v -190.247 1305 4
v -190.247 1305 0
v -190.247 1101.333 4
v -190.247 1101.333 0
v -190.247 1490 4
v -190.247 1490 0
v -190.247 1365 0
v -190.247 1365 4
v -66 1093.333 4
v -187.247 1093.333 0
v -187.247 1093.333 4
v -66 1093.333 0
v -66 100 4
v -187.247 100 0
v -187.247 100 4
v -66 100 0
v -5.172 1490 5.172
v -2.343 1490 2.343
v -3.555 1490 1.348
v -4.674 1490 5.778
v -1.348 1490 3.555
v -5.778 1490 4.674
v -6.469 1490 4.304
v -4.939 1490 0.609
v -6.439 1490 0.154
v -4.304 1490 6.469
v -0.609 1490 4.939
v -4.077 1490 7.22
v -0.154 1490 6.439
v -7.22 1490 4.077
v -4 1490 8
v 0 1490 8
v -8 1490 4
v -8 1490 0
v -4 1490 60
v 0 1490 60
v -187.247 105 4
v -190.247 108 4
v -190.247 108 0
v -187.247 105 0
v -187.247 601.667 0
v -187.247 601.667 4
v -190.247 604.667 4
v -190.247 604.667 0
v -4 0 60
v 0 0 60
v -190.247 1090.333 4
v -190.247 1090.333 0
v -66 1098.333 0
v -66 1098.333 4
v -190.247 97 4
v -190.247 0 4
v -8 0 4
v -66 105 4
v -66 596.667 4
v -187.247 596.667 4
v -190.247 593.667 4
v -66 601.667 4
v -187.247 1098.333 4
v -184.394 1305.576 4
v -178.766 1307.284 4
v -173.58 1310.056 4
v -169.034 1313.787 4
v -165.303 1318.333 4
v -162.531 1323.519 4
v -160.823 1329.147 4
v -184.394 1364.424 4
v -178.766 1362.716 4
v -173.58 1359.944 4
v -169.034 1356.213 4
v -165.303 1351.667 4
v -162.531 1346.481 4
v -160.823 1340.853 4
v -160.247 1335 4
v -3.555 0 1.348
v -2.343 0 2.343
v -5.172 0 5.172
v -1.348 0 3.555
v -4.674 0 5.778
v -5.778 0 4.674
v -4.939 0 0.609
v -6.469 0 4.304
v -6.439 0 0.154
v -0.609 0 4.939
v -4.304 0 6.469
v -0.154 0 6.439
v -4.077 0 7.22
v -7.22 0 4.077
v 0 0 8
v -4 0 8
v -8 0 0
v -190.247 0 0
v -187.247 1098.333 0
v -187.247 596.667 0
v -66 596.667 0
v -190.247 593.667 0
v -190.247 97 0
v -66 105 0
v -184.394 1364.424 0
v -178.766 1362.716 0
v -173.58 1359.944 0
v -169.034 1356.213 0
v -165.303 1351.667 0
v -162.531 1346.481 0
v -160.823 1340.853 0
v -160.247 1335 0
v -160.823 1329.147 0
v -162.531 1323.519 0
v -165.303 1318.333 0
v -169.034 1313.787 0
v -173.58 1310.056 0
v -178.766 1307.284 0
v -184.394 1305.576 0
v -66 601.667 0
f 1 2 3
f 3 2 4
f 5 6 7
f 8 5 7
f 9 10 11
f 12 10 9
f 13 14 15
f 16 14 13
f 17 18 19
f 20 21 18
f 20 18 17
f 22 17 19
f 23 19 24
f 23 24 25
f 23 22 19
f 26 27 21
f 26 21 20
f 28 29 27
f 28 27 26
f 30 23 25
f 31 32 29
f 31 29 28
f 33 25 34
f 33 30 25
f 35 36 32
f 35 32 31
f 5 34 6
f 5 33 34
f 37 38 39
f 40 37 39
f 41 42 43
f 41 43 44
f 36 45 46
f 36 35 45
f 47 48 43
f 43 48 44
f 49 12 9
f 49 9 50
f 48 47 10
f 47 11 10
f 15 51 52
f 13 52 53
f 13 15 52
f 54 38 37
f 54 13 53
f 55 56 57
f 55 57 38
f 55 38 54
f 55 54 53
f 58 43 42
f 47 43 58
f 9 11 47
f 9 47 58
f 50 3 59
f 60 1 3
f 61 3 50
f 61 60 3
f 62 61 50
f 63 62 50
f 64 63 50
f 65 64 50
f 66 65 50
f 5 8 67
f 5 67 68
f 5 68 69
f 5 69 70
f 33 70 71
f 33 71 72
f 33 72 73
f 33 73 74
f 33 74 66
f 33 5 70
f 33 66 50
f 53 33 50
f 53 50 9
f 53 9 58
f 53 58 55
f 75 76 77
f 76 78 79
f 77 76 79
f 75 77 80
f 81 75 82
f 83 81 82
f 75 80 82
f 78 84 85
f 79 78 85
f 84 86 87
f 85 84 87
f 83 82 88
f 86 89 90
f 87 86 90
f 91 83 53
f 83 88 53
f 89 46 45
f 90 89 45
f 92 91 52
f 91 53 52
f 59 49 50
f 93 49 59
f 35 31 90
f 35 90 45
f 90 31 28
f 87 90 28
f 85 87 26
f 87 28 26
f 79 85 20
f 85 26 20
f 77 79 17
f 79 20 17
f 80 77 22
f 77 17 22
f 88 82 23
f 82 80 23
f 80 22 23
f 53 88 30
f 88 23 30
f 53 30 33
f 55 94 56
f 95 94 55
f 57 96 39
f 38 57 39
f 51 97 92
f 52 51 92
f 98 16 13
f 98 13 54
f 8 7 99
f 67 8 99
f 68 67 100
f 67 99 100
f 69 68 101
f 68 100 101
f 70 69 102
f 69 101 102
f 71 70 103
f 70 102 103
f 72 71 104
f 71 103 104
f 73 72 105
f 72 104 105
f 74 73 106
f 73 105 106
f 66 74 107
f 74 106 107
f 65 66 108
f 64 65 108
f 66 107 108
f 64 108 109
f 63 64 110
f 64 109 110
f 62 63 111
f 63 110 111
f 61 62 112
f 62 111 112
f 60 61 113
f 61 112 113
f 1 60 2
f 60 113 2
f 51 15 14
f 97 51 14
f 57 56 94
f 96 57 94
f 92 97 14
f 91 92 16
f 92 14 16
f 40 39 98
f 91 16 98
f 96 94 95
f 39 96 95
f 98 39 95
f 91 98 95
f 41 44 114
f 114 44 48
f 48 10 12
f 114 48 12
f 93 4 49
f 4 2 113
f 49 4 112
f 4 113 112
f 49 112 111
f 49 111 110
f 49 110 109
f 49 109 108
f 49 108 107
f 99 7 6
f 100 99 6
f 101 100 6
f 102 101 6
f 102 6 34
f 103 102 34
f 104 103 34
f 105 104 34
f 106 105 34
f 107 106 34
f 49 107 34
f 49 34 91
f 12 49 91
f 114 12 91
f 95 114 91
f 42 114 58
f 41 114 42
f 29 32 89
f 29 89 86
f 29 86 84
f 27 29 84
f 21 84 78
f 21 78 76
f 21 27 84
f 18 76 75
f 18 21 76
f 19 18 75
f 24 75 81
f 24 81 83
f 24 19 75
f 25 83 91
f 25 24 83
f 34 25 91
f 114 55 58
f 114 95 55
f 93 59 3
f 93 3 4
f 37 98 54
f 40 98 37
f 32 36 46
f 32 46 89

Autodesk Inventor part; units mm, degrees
ref_plane "YZ Plane" through (0, 0, 0) normal (1, 0, 0) x (0, 1, 0)
ref_plane "XZ Plane" through (0, 0, 0) normal (0, 1, 0) x (-1, 0, 0)
ref_plane "XY Plane" through (0, 0, 0) normal (0, 0, 1) x (1, 0, 0)
sketch "Sketch1" plane through (0, 0, 0) normal (0, 0, 1) x (1, 0, 0)
  line L0 (0, 1490) -> (-190.2469, 1490)
  line L1 (-190.2469, 1490) -> (-190.2469, 0)
  line L2 (-190.2469, 0) -> (0, 0)
  line L3 (0, 0) -> (0, 1490)
  line L4 (-190.2469, 100) -> (-66, 100)
  line L5 (-66, 100) -> (-66, 105)
  line L6 (-66, 105) -> (-190.2469, 105)
  line L7 (-190.2469, 105) -> (-190.2469, 100)
  line L8 (-190.2469, 596.6667) -> (-66, 596.6667)
  line L9 (-66, 596.6667) -> (-66, 601.6667)
  line L10 (-66, 601.6667) -> (-190.2469, 601.6667)
  line L11 (-190.2469, 601.6667) -> (-190.2469, 596.6667)
  line L12 (-190.2469, 1093.3333) -> (-66, 1093.3333)
  line L13 (-66, 1093.3333) -> (-66, 1098.3333)
  line L14 (-66, 1098.3333) -> (-190.2469, 1098.3333)
  line L15 (-190.2469, 1098.3333) -> (-190.2469, 1093.3333)
  circle A0 centre (-190.2469, 1335) radius 30
  point P0 (-190.2469, 1098.3333)
  point P1 (-190.2469, 1093.3333)
  point P2 (-190.2469, 601.6667)
  point P3 (-190.2469, 596.6667)
  point P4 (-190.2469, 1365)
  point P5 (-190.2469, 1305)
  dimension "d0" = 1490
  dimension "d1" = 190.2469
  dimension "d2" = 5
  dimension "d4" = 100
  dimension "d7" = 496.6667
  dimension "d23" = 66
  dimension "d29" = 60
  dimension "d30" = 1335
extrude "Plate1" add sketch "Sketch1" along normal blind 4 contours L3 L2 L1 L4 L5 L6 L8 L9 L10 L12 L13 L14 A0 L0
sketch "Sketch2" plane through (-4, 1490, 0) normal (1, 0, 0) x (0, 1, 0)
  line L0 (-1490, 0) -> (0, 0)
  line L1 (0, 0) -> (0, 60)
  line L2 (0, 60) -> (-1490, 60)
  line L3 (-1490, 60) -> (-1490, 0)
edge flange "Flange1" height 60 angle 90 thickness 4 bend radius 4 thickness toward (1, 0, 0) relief tear relief width 4 relief depth 2 edges at (0, 745, 4) wall of the first edge with corners at (-4, 0, 0) (-4, 1490, 0) (-4, 1490, 60) (-4, 0, 60)
bend "Bend1"
corner "Corner1"
chamfer "Corner Chamfer1" distance 3 angle 45 6 edges at (-190.2469, 100, 2) (-190.2469, 105, 2) (-190.2469, 596.6667, 2) (-190.2469, 601.6667, 2) (-190.2469, 1098.3333, 2) (-190.2469, 1093.3333, 2)
equation "\"d0\" = Стрингер_длина"
equation "\"d1\" = стрингер_глубина_1"
equation "\"d2\" = паз_под_стрингер_толщина"
equation "\"d7\" = Шаг_шпангоутов"
equation "\"d23\" = паз_под_стрингер_глубина - Thickness"
equation "\"d29\" = 2 * радиус_выреза_под_сварку"
equation "\"d12\" = Thickness"
equation "\"d13\" = BendReliefWidth"
equation "\"d14\" = BendReliefDepth"
equation "\"d15\" = MinimumRemnant"
equation "\"d16\" = TransitionRadius"
equation "\"d17\" = ребро_усилителей"
equation "\"d19\" = BendRadius"
equation "\"d20\" = CornerReliefSize"
equation "\"d21\" = GapSize"
equation "\"d22\" = JacobiRadiusSize"
equation "\"BendRadius\" = Thickness"
equation "\"BendReliefWidth\" = Thickness"
equation "\"BendReliefDepth\" = 0.5 * Thickness"
equation "\"CornerReliefSize\" = 4 * Thickness"
equation "\"MinimumRemnant\" = 2 * Thickness"
equation "\"TransitionRadius\" = BendRadius"
equation "\"JacobiRadiusSize\" = BendRadius"
equation "\"GapSize\" = Thickness"
equation "\"Стрингер_длина\" = 1490"
equation "\"стрингер_глубина_1\" = 190.246925"
equation "\"паз_под_стрингер_толщина\" = 5"
equation "\"Шаг_шпангоутов\" = 496.666667"
equation "\"паз_под_стрингер_глубина\" = 70"
equation "\"Thickness\" = 4"
equation "\"радиус_выреза_под_сварку\" = 30"
equation "\"ребро_усилителей\" = 60"
properties part number "GBK 0102 stringer 1" material "Steel"
